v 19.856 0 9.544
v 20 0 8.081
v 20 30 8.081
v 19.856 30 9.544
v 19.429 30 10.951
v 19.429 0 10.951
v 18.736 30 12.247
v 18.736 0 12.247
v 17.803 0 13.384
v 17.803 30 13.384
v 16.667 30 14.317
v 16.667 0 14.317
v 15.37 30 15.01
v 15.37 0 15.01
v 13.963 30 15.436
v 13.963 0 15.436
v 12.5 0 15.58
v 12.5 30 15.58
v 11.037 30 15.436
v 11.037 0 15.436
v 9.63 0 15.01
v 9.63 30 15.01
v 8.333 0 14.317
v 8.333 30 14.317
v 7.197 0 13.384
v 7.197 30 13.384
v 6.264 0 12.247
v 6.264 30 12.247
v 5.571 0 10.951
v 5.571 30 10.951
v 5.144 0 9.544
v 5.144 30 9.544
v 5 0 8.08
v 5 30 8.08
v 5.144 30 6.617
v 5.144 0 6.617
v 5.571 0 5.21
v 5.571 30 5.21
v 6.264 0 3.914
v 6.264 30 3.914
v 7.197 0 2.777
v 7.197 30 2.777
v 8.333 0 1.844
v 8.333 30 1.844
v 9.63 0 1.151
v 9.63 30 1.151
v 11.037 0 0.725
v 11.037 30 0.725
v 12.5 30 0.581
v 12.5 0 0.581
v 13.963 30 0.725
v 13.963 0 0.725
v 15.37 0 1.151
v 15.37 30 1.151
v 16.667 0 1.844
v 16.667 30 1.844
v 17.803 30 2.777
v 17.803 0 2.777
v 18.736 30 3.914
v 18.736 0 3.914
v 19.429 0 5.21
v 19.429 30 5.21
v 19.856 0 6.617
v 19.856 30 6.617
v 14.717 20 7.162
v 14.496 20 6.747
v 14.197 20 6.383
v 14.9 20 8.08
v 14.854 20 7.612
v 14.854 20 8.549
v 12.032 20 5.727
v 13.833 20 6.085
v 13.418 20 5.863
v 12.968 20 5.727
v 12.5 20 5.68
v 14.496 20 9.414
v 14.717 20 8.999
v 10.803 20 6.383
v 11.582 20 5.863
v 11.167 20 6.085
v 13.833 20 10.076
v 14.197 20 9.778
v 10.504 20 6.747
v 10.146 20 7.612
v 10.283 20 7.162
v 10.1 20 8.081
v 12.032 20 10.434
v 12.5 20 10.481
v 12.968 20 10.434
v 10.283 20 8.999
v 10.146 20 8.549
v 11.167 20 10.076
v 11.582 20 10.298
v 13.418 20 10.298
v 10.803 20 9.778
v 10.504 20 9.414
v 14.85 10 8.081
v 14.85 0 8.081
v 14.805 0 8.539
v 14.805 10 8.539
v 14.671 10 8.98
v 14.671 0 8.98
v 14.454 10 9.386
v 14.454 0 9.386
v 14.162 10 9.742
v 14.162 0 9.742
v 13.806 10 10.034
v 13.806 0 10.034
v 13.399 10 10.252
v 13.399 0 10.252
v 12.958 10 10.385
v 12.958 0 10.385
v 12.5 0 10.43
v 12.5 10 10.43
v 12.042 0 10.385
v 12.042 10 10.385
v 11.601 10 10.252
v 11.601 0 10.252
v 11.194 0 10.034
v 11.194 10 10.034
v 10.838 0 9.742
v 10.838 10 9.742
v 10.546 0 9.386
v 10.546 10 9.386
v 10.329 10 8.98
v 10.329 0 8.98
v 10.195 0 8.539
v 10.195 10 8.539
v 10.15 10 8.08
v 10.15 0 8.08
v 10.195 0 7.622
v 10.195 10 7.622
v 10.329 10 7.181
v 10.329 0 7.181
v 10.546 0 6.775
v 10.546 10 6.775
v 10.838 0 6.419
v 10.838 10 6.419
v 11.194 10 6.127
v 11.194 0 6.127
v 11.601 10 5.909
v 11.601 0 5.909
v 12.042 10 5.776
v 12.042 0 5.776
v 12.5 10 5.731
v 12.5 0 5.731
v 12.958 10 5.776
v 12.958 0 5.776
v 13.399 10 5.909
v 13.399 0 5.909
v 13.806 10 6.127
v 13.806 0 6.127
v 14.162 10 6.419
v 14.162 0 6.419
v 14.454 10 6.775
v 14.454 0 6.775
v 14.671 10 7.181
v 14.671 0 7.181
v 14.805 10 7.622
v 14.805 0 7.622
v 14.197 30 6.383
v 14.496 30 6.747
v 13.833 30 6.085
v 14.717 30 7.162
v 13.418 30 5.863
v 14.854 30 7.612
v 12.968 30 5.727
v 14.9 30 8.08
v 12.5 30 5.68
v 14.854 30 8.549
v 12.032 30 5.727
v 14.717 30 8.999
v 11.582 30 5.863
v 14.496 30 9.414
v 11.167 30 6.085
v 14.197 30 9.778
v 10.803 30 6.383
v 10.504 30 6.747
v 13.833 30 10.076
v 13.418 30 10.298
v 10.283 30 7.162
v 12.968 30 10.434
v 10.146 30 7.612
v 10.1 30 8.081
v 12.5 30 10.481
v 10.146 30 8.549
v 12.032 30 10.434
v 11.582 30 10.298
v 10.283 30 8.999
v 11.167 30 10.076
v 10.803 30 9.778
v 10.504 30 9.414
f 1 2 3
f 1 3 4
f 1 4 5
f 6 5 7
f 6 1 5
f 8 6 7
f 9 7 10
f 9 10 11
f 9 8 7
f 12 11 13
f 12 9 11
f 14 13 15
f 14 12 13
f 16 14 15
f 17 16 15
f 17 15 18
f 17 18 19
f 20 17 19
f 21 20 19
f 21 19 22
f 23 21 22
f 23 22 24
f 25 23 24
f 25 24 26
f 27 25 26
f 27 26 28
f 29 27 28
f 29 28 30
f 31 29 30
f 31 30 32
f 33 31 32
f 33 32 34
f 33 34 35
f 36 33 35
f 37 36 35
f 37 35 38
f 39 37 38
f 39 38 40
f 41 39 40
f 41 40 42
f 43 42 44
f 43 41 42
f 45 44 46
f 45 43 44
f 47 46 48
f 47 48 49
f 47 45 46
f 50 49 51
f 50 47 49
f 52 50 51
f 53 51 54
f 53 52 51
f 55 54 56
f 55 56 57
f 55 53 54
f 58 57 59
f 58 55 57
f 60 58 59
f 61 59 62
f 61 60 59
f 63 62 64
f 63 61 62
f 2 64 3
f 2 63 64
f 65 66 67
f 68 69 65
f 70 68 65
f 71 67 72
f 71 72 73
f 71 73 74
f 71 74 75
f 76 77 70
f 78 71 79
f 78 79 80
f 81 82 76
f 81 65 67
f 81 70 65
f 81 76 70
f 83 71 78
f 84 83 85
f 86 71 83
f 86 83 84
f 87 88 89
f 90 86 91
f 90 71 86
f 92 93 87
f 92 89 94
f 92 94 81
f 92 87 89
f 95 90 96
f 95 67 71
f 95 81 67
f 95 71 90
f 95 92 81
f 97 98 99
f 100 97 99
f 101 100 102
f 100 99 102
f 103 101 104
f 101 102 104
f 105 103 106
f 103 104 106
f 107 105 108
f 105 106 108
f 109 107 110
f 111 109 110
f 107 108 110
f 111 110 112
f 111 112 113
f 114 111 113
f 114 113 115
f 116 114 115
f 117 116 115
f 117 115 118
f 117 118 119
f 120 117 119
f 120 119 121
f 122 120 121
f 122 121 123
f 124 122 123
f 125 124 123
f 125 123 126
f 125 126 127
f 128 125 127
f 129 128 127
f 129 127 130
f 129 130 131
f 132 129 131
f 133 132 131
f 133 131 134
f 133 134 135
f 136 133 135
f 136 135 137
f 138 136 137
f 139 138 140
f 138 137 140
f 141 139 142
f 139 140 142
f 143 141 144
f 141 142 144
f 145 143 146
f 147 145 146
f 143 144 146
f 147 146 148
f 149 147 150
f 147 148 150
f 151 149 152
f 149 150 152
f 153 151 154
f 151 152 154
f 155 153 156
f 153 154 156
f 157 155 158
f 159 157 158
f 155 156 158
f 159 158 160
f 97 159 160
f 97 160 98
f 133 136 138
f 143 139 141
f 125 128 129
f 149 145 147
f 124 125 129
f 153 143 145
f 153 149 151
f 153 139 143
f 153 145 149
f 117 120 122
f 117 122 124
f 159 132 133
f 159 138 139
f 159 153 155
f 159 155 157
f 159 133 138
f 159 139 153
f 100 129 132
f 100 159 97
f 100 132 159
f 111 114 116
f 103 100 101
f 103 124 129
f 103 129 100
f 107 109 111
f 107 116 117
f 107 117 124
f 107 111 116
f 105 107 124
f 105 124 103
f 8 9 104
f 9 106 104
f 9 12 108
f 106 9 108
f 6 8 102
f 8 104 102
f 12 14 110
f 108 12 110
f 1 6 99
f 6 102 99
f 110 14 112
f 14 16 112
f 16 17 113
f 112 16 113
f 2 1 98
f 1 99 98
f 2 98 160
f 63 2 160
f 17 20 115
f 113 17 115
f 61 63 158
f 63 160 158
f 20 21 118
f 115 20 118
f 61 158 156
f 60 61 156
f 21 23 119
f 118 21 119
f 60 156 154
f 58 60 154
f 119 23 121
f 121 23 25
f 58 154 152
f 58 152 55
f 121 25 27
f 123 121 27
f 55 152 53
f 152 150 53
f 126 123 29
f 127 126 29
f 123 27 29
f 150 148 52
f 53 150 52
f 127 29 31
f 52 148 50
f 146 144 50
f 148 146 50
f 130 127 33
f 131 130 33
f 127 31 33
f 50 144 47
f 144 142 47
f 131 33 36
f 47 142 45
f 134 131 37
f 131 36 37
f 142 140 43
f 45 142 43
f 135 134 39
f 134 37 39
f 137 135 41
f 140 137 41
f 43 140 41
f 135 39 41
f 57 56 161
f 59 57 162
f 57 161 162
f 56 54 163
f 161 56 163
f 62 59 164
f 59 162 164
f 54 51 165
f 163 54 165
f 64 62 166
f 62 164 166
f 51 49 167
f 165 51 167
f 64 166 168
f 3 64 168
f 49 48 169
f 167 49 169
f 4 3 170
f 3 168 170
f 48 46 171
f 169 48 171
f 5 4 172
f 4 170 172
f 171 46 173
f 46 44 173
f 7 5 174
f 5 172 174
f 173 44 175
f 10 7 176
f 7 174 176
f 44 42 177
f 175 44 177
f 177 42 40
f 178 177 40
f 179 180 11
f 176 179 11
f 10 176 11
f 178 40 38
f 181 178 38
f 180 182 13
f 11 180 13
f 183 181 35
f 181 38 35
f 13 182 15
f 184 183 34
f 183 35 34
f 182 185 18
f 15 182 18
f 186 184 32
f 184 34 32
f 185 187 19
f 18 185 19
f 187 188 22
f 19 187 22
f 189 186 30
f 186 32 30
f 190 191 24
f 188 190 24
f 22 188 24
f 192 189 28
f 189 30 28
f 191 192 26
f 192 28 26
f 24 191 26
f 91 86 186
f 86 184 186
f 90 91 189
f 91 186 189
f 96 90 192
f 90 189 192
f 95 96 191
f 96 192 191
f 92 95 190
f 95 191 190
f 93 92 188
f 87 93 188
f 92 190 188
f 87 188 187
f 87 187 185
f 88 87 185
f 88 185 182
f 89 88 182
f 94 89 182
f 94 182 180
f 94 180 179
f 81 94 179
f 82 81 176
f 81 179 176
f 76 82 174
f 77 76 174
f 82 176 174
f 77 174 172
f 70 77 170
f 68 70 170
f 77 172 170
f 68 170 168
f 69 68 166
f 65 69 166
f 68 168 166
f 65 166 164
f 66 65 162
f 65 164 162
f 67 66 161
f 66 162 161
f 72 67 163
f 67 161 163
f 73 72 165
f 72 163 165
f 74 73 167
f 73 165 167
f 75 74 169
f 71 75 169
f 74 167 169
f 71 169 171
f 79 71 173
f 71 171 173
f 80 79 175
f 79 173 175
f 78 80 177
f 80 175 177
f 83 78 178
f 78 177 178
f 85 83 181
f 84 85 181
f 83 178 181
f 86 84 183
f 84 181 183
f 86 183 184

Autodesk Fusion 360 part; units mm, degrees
sketch "Sketch1" plane through (0, 0, 0) normal (1, 0, 0) x (0, 1, 0)
  line L0 (0, 0) -> (30, 0)
  line L1 (30, 0) -> (30, 16.161)
  line L2 (30, 16.161) -> (0, 16.161)
  line L3 (0, 16.161) -> (0, 0)
  line L4 (15, 0) -> (15, 16.161)
  dimension "d1" = 30
extrude "Extrude1" add sketch "Sketch1" along normal blind 25
sketch "Sketch2" plane through (0, 0, 0) normal (0, -1, 0) x (1, 0, 0)
  line L0 (0, 16.161) -> (0, 0)
  line L1 (0, 0) -> (25, 0)
  line L2 (25, 0) -> (25, 16.161)
  line L3 (25, 16.161) -> (0, 16.161)
  circle A0 centre (12.5, 8.0805) radius 2.35
  dimension "d4" = 4.7
sketch "Sketch3" plane through (0, 0, 0) normal (0, -1, 0) x (1, 0, 0)
sketch "Sketch4" plane through (0, 30, 0) normal (0, 1, 0) x (-1, 0, 0)
  line L0 (0, 0) -> (0, 16.161)
  line L1 (0, 16.161) -> (-25, 16.161)
  line L2 (-25, 16.161) -> (-25, 0)
  line L3 (-25, 0) -> (0, 0)
  circle A0 centre (-12.5, 8.0805) radius 2.4
  dimension "d5" = 4.8
extrude "Extrude2" cut sketch "Sketch4" against normal blind 10 contours A0
extrude "Extrude3" cut sketch "Sketch2" against normal blind 10 contours A0
sketch "Sketch5" plane through (0, 0, 0) normal (0, -1, 0) x (1, 0, 0)
  circle A0 centre (12.5, 8.0805) radius 2.35
  line L0 (0, 16.161) -> (0, 0)
  line L1 (0, 0) -> (25, 0)
  line L2 (25, 0) -> (25, 16.161)
  line L3 (25, 16.161) -> (0, 16.161)
  circle A1 centre (12.5, 8.0805) radius 7.5
  dimension "d10" = 15
extrude "Extrude4" cut sketch "Sketch5" against normal blind 45 contours L0 L1 L2 L3
